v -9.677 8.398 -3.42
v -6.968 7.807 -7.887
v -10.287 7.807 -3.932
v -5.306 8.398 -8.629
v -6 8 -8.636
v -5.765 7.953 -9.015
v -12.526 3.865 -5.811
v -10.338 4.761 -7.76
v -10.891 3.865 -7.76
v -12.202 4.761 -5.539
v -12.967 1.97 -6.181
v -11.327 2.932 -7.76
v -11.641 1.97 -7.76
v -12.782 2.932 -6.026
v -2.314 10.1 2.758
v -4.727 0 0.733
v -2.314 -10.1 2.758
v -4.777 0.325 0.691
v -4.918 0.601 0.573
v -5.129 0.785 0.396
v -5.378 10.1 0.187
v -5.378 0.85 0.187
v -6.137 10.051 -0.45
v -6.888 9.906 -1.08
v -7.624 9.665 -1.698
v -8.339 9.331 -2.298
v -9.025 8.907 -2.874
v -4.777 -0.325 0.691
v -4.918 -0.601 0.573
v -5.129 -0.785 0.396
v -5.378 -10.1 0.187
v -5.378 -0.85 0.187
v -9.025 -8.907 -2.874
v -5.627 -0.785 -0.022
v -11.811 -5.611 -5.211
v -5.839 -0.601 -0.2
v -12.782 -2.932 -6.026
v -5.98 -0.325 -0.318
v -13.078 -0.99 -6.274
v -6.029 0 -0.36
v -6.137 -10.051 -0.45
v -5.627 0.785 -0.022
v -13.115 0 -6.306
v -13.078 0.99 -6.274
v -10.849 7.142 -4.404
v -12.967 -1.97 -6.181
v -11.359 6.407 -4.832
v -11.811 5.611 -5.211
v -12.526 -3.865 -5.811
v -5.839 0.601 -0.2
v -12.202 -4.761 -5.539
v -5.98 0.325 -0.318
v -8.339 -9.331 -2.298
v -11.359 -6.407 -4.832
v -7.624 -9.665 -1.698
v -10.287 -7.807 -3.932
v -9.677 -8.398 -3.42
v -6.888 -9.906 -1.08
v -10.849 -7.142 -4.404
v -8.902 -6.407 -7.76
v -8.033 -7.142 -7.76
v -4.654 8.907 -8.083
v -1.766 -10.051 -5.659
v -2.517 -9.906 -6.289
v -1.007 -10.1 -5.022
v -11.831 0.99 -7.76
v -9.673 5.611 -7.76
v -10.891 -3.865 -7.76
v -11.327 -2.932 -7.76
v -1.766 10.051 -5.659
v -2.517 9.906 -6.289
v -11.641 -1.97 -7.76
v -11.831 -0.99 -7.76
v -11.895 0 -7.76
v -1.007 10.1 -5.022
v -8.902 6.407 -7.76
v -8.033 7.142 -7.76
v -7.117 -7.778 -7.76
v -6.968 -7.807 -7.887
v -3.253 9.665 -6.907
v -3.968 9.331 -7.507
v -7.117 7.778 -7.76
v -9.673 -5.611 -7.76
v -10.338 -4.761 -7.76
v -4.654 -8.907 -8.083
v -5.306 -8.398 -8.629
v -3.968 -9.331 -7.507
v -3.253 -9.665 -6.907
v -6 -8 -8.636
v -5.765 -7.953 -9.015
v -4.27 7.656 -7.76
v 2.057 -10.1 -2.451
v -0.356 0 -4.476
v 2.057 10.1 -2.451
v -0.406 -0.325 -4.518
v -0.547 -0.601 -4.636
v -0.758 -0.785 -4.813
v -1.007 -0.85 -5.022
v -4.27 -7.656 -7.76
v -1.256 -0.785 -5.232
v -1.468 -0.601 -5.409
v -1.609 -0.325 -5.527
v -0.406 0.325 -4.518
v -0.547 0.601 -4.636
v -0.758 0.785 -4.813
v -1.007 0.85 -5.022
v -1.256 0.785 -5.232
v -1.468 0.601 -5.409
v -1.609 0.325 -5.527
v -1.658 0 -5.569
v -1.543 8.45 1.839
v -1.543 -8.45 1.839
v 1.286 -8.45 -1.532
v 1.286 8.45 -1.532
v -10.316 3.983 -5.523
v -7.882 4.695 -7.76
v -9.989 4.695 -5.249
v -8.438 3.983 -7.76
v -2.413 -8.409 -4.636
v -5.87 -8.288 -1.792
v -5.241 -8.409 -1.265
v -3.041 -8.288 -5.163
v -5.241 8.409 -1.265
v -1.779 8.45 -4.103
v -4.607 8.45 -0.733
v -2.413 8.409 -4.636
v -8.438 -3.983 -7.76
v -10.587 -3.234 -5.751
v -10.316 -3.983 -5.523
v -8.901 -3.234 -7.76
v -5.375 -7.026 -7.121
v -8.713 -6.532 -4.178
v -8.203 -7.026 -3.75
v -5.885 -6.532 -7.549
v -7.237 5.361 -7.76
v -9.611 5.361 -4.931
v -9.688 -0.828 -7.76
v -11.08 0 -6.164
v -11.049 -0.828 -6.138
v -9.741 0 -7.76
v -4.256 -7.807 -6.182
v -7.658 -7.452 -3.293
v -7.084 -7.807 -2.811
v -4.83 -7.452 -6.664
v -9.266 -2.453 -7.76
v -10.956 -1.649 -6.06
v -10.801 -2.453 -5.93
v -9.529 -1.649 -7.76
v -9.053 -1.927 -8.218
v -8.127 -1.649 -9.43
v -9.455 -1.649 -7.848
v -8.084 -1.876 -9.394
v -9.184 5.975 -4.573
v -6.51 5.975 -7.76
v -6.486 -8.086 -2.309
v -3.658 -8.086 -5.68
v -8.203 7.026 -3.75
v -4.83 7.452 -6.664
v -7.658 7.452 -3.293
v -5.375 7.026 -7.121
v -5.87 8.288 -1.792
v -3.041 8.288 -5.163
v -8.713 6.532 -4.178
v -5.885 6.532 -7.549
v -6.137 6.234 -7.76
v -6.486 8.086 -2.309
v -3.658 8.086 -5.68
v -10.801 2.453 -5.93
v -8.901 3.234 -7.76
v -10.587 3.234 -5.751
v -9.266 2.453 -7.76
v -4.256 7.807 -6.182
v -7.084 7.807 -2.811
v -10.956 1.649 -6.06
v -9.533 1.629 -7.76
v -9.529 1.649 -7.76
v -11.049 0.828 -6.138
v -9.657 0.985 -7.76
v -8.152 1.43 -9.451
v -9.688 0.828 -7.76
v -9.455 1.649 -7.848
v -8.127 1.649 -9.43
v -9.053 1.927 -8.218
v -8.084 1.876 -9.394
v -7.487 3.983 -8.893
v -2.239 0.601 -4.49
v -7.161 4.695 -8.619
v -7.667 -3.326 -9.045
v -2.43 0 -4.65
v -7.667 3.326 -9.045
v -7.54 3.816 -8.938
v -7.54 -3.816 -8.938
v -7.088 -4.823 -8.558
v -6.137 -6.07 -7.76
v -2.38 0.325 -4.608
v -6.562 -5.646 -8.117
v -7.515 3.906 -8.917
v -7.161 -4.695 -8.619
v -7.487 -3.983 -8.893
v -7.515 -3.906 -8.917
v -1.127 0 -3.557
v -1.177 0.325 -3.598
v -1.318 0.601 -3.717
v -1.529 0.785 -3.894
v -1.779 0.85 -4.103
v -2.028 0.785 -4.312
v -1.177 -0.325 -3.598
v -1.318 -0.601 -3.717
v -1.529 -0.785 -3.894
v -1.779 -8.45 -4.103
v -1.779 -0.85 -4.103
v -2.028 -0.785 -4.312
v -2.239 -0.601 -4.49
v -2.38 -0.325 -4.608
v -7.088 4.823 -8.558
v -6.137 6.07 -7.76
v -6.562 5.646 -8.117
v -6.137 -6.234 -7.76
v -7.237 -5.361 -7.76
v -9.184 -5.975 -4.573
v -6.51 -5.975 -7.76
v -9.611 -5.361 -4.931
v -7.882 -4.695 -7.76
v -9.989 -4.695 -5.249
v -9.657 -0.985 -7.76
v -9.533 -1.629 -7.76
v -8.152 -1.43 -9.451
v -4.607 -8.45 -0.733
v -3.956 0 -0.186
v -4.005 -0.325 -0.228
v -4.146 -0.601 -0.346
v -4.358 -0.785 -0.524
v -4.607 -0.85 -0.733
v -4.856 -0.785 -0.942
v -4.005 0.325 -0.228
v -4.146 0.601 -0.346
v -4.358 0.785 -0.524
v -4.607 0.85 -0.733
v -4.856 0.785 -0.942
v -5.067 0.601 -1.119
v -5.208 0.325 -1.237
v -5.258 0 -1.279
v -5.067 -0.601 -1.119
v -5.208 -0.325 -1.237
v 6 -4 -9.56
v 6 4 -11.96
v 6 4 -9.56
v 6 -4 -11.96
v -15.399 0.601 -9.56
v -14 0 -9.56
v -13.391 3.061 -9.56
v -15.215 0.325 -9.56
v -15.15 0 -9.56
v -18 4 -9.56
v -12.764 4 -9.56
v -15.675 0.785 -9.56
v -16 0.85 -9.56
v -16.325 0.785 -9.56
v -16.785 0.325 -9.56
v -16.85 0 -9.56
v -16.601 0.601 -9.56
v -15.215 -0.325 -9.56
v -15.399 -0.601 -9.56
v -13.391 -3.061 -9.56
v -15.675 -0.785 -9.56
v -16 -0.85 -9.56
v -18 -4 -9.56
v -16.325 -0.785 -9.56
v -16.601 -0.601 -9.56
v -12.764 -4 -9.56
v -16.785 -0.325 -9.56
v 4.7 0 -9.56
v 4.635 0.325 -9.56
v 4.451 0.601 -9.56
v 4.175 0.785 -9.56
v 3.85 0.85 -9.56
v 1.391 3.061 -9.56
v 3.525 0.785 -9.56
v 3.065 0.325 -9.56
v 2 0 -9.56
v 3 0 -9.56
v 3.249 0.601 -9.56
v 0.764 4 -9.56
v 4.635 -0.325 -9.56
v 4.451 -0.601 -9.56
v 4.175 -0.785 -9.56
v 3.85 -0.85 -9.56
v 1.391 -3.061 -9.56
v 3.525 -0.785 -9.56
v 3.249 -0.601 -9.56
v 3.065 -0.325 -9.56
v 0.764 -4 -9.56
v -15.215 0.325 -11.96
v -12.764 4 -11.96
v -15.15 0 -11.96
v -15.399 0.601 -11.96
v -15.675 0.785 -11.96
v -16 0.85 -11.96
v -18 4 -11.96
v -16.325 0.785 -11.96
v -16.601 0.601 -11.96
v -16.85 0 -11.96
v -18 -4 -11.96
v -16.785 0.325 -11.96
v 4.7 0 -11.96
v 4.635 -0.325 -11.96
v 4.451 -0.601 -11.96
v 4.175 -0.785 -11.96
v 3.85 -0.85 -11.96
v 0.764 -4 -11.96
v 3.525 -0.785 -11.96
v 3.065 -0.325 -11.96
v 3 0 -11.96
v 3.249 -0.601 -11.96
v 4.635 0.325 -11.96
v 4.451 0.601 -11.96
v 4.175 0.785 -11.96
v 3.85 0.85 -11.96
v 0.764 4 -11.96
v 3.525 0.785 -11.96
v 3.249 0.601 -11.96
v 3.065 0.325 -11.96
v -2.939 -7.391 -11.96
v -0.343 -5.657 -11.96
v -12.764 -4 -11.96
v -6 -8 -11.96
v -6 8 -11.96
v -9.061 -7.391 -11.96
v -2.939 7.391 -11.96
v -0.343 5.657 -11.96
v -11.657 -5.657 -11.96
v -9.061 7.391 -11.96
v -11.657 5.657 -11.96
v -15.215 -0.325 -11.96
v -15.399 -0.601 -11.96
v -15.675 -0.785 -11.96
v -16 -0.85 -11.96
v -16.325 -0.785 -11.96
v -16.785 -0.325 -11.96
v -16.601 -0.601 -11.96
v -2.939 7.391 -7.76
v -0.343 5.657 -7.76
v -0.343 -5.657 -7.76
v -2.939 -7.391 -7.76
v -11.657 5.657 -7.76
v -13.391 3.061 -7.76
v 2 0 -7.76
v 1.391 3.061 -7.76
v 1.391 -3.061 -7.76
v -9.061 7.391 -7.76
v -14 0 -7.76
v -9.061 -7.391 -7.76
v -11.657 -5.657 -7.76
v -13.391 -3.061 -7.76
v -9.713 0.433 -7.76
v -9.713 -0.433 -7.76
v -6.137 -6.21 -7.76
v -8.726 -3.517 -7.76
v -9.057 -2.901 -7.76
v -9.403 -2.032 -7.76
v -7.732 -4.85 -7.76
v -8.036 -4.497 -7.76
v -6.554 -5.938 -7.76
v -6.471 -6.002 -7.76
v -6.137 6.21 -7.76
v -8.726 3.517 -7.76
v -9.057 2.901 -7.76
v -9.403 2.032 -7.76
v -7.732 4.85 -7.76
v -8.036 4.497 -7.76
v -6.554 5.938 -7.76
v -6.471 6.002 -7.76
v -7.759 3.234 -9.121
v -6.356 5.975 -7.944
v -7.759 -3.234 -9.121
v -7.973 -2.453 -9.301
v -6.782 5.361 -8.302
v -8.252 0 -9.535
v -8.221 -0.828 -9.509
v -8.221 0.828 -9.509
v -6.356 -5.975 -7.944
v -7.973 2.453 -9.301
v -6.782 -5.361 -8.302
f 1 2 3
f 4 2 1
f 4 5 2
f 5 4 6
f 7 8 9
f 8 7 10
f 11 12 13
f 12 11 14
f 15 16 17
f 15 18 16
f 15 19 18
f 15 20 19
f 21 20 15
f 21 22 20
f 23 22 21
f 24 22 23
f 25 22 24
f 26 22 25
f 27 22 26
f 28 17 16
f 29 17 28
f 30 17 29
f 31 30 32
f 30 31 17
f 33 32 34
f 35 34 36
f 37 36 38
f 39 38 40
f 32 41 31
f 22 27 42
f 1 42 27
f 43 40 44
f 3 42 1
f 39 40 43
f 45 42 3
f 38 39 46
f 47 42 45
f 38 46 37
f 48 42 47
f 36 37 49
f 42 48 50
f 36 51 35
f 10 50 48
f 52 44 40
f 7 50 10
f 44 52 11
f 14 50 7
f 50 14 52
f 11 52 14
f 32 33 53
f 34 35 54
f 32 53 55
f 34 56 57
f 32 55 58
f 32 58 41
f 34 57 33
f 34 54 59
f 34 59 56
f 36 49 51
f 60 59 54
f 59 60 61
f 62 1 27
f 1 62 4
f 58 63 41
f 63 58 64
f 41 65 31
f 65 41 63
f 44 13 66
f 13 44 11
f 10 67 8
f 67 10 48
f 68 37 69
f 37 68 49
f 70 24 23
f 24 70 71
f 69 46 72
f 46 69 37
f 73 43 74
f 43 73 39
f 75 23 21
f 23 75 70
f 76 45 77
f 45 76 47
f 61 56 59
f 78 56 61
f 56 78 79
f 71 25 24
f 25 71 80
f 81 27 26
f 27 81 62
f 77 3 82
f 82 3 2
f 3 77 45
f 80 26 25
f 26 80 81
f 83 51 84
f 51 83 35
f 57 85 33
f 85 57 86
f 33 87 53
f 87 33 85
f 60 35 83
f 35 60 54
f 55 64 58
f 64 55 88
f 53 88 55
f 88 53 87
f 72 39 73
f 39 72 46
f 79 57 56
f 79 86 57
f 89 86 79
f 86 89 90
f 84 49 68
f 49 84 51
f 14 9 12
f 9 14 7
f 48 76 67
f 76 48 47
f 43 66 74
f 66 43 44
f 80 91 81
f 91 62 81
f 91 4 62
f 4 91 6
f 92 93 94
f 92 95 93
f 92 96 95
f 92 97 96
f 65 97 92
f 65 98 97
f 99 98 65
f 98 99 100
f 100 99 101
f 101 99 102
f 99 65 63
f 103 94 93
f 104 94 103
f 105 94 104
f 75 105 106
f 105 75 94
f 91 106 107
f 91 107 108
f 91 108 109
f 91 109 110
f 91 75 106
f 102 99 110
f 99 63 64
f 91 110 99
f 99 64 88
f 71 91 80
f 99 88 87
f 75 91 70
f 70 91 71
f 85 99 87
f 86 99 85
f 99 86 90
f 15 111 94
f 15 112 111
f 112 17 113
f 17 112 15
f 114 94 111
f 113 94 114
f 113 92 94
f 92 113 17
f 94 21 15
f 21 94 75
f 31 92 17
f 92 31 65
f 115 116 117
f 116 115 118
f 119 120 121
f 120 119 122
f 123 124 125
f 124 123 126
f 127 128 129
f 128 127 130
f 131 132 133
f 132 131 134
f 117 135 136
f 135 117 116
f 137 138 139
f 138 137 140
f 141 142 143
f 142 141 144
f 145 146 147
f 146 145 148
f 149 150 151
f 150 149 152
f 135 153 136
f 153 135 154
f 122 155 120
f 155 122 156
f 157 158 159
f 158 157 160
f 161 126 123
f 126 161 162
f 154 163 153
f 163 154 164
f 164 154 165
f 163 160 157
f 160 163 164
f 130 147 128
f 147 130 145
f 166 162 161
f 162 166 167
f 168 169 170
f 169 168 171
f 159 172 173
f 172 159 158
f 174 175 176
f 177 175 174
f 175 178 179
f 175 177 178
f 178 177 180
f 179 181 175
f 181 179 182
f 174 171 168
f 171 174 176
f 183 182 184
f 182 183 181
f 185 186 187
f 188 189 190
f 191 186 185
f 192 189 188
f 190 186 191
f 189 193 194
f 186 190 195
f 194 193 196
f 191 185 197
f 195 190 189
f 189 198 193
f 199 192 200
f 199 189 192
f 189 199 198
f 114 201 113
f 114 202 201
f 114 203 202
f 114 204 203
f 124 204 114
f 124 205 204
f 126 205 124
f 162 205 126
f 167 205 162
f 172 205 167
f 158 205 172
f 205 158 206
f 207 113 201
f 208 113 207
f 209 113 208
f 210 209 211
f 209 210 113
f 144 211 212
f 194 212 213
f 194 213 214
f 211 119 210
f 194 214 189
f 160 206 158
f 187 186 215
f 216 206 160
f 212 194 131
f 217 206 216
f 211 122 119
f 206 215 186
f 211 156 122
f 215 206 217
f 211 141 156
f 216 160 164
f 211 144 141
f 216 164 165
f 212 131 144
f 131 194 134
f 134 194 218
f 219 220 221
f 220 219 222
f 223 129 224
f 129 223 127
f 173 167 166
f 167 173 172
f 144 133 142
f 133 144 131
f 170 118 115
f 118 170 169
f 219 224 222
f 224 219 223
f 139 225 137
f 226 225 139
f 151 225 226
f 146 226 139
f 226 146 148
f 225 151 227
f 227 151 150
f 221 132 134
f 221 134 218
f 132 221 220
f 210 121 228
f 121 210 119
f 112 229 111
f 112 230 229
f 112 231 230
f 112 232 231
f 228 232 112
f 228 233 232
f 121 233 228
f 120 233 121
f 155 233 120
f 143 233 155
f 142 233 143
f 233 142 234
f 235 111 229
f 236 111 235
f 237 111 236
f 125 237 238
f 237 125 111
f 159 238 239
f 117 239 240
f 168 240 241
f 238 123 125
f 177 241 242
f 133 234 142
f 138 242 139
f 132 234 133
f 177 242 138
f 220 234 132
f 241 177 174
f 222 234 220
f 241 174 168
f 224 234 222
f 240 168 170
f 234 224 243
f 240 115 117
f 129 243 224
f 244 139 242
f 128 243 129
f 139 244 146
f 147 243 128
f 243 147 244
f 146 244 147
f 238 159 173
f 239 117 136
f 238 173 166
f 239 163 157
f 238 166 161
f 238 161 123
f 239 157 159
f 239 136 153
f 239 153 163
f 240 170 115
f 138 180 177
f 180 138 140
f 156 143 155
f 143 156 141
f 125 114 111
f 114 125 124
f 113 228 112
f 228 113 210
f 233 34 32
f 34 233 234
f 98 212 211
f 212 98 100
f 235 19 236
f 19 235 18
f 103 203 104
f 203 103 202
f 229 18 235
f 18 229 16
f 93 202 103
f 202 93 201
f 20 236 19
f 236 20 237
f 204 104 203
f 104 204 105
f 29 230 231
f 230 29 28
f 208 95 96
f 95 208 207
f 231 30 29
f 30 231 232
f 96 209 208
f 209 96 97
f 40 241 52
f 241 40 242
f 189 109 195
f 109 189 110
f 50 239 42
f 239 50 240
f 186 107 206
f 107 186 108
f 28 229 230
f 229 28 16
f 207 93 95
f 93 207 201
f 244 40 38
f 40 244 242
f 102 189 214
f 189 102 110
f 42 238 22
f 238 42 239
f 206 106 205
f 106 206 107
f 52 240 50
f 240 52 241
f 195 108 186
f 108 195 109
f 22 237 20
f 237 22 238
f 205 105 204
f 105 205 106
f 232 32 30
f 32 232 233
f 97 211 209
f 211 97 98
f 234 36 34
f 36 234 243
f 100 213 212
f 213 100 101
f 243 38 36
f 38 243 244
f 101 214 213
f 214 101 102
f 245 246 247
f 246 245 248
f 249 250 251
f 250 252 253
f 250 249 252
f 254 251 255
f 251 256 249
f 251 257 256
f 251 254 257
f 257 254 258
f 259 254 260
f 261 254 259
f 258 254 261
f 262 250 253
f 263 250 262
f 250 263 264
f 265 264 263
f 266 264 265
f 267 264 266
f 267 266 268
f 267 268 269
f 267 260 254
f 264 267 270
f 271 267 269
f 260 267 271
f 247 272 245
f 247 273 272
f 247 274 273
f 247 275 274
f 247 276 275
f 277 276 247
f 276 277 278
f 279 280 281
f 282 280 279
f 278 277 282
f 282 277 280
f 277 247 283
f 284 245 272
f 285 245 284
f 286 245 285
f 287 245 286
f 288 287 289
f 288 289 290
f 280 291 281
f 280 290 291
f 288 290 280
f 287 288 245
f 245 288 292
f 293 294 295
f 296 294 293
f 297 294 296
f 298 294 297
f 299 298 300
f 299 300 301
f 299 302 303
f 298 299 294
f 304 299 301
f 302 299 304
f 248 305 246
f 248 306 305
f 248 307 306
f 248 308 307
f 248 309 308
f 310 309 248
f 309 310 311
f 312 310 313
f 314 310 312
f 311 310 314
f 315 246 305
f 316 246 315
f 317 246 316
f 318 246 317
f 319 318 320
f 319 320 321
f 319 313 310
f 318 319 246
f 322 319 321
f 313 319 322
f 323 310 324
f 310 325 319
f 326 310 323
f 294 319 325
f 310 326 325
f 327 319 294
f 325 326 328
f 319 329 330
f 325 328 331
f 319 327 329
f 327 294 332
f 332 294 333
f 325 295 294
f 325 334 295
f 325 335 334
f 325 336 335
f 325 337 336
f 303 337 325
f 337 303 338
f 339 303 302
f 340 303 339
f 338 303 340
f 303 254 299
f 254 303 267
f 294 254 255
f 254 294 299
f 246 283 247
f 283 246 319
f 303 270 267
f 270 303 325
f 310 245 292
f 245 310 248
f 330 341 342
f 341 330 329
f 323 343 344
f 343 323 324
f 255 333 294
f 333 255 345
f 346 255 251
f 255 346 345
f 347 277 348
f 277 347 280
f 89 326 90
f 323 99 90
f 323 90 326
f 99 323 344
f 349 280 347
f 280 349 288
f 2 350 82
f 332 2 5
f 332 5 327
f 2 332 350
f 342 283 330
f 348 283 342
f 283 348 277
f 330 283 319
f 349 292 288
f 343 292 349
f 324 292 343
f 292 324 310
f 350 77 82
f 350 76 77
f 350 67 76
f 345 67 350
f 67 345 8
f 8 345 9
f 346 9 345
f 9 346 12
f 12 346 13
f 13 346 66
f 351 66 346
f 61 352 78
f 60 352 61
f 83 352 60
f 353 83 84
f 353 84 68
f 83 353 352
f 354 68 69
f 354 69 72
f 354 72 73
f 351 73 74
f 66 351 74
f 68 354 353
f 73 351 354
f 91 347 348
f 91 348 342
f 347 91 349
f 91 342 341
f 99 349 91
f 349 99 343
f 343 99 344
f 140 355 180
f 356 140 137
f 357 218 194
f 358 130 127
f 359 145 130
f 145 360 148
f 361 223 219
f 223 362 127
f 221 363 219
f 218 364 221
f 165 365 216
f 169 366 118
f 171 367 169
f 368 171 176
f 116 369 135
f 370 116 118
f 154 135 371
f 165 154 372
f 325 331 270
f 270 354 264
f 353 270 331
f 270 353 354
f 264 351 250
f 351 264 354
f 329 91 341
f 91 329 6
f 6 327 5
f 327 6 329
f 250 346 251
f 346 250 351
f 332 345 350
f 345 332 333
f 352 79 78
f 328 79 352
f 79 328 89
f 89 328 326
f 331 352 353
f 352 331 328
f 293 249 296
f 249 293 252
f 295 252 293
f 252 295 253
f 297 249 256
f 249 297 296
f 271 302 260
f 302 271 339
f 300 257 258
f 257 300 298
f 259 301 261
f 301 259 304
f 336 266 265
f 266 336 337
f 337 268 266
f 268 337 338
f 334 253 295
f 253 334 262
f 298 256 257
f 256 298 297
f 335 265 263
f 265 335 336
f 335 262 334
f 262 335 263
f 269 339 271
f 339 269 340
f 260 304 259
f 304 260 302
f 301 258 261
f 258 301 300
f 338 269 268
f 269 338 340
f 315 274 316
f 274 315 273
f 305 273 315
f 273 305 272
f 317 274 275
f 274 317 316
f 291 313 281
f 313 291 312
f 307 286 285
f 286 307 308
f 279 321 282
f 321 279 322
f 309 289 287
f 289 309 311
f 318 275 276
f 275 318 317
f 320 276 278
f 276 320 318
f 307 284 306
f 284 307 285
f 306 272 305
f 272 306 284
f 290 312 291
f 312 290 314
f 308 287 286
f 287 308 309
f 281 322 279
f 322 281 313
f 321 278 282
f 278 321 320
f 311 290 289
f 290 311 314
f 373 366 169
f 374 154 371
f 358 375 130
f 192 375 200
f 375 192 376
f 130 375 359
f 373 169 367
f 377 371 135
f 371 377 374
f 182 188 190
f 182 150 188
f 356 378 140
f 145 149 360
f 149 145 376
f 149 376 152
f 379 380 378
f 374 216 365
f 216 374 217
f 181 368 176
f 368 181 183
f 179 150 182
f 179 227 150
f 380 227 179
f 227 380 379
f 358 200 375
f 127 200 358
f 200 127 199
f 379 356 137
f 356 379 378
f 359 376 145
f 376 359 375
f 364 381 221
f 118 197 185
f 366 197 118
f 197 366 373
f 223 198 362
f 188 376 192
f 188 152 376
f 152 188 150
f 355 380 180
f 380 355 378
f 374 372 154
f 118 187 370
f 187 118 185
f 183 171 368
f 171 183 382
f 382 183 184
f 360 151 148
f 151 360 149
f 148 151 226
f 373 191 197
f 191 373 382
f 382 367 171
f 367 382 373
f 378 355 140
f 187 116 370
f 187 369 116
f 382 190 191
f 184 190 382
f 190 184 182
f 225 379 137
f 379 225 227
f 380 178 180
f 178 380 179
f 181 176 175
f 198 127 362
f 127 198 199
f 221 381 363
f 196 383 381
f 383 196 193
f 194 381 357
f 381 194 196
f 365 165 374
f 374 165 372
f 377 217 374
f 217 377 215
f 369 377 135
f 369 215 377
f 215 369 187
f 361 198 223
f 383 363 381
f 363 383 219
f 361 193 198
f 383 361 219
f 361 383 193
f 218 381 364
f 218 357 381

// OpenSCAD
/*Battery dimensions in mm
CR1225 cell holder: 
 diameter=12mm 
 height=2.5mm 
 tolerance=0.5mm 
 wall thickness=2mm 

CR2032 cell holder: 
 diameter=20mm 
 height=3.2mm 

CR1632 cell holder: 
 diameter=16mm 
 height=3.2mm 

*/

battery_diameter	= 16.0;	// Diameter of battery
battery_height = 3.5;	// Thickness of battery
tolerance = 0.9;	// Make things a little looser
wall_thickness = 1.2;	// Wall thickness
wire_diameter = 1.7;	// Thickness of wire openings
number_of_cells = 1;		// How many cells will be stacked
pitch = 1.27; // 0.1" pitch = 2.54mm / 2 = 1.27
// For a base on both sides:
// base_width = pitch*9;
// base_offset = 0.25;
base_width = 24;
base_length = 8; // pitch*17 for a wide mounting base
base_offset = -6;

extra_length	= -battery_diameter/2+4;	// Extends the opening to shroud the battery

module battery() {
    difference(){
        union(){
            difference(){
                cylinder(r=(battery_diameter/2)+tolerance+wall_thickness, h=battery_height*number_of_cells+(tolerance)+(2*wall_thickness),$fn=64);
                // Cut the cylinder in half
                translate([0,-((battery_diameter/2)+2+tolerance),0])
                    cube([battery_diameter+10,battery_diameter*number_of_cells+5,battery_height*number_of_cells+5]);
            }

        // Square extension up the top
        translate([0,-((battery_diameter/2)+wall_thickness+tolerance),0])
            cube([battery_diameter/2+extra_length,battery_diameter+(2*wall_thickness)+(2*tolerance),battery_height*number_of_cells+(2*wall_thickness)+tolerance]);
    }
      // Cut-out battery shape
      translate([0,0,wall_thickness])
        cylinder(r=(battery_diameter/2)+(tolerance/2), h=battery_height*number_of_cells+tolerance,$fn=64);

      // Cut-out the square extension
      translate([0,-((battery_diameter/2))-(tolerance/2),wall_thickness])
        cube([battery_diameter+tolerance,battery_diameter+tolerance,battery_height*number_of_cells+tolerance]);

      // Cut-out side wire holes
      translate([0,0,-1])
        cylinder(r=wire_diameter/2, h=battery_height*number_of_cells+tolerance+10,$fn=16);
 
  }
}


rotate([0,-40,0]){ //[0,-90,0]
  // Move to propper hieght and orientation
  translate([-battery_diameter/2-extra_length,0,-(battery_height*number_of_cells)+(wall_thickness/4)]){
    battery();
  }
}

difference(){
rotate([0,-90,0]){ //[0,-90,0]
    // Base
    translate([-battery_diameter/2-wall_thickness*3.3, -base_length/2, base_width+base_offset])
      difference(){
        union(){
          rotate([0,90,0])
            cube([base_width,base_length,wall_thickness*2]);
          rotate([0,90,0])
            translate([base_width/2,base_length/2,0])
              cylinder(r=battery_diameter/2, h=wall_thickness*3.5,$fn=16);
        }
        rotate([0,90,0]){
          translate([2,base_length/2,0])
            cylinder(r=wire_diameter/2,h=wall_thickness*4,$fn=16);
          translate([2+19.85,base_length/2,0])
            cylinder(r=wire_diameter/2,h=wall_thickness*4,$fn=16);
          }

      }
}

// Cut-out battery shape
rotate([0,-40,0]){ //[0,-90,0]
  // Move to propper hieght and orientation
  translate([-battery_diameter/2-extra_length,0,-(battery_height*number_of_cells)+(wall_thickness/4)]){
      translate([0,0,wall_thickness])
        cylinder(r=(battery_diameter/2)+(tolerance/2), h=battery_height*number_of_cells+tolerance,$fn=64);
}
}    
}
